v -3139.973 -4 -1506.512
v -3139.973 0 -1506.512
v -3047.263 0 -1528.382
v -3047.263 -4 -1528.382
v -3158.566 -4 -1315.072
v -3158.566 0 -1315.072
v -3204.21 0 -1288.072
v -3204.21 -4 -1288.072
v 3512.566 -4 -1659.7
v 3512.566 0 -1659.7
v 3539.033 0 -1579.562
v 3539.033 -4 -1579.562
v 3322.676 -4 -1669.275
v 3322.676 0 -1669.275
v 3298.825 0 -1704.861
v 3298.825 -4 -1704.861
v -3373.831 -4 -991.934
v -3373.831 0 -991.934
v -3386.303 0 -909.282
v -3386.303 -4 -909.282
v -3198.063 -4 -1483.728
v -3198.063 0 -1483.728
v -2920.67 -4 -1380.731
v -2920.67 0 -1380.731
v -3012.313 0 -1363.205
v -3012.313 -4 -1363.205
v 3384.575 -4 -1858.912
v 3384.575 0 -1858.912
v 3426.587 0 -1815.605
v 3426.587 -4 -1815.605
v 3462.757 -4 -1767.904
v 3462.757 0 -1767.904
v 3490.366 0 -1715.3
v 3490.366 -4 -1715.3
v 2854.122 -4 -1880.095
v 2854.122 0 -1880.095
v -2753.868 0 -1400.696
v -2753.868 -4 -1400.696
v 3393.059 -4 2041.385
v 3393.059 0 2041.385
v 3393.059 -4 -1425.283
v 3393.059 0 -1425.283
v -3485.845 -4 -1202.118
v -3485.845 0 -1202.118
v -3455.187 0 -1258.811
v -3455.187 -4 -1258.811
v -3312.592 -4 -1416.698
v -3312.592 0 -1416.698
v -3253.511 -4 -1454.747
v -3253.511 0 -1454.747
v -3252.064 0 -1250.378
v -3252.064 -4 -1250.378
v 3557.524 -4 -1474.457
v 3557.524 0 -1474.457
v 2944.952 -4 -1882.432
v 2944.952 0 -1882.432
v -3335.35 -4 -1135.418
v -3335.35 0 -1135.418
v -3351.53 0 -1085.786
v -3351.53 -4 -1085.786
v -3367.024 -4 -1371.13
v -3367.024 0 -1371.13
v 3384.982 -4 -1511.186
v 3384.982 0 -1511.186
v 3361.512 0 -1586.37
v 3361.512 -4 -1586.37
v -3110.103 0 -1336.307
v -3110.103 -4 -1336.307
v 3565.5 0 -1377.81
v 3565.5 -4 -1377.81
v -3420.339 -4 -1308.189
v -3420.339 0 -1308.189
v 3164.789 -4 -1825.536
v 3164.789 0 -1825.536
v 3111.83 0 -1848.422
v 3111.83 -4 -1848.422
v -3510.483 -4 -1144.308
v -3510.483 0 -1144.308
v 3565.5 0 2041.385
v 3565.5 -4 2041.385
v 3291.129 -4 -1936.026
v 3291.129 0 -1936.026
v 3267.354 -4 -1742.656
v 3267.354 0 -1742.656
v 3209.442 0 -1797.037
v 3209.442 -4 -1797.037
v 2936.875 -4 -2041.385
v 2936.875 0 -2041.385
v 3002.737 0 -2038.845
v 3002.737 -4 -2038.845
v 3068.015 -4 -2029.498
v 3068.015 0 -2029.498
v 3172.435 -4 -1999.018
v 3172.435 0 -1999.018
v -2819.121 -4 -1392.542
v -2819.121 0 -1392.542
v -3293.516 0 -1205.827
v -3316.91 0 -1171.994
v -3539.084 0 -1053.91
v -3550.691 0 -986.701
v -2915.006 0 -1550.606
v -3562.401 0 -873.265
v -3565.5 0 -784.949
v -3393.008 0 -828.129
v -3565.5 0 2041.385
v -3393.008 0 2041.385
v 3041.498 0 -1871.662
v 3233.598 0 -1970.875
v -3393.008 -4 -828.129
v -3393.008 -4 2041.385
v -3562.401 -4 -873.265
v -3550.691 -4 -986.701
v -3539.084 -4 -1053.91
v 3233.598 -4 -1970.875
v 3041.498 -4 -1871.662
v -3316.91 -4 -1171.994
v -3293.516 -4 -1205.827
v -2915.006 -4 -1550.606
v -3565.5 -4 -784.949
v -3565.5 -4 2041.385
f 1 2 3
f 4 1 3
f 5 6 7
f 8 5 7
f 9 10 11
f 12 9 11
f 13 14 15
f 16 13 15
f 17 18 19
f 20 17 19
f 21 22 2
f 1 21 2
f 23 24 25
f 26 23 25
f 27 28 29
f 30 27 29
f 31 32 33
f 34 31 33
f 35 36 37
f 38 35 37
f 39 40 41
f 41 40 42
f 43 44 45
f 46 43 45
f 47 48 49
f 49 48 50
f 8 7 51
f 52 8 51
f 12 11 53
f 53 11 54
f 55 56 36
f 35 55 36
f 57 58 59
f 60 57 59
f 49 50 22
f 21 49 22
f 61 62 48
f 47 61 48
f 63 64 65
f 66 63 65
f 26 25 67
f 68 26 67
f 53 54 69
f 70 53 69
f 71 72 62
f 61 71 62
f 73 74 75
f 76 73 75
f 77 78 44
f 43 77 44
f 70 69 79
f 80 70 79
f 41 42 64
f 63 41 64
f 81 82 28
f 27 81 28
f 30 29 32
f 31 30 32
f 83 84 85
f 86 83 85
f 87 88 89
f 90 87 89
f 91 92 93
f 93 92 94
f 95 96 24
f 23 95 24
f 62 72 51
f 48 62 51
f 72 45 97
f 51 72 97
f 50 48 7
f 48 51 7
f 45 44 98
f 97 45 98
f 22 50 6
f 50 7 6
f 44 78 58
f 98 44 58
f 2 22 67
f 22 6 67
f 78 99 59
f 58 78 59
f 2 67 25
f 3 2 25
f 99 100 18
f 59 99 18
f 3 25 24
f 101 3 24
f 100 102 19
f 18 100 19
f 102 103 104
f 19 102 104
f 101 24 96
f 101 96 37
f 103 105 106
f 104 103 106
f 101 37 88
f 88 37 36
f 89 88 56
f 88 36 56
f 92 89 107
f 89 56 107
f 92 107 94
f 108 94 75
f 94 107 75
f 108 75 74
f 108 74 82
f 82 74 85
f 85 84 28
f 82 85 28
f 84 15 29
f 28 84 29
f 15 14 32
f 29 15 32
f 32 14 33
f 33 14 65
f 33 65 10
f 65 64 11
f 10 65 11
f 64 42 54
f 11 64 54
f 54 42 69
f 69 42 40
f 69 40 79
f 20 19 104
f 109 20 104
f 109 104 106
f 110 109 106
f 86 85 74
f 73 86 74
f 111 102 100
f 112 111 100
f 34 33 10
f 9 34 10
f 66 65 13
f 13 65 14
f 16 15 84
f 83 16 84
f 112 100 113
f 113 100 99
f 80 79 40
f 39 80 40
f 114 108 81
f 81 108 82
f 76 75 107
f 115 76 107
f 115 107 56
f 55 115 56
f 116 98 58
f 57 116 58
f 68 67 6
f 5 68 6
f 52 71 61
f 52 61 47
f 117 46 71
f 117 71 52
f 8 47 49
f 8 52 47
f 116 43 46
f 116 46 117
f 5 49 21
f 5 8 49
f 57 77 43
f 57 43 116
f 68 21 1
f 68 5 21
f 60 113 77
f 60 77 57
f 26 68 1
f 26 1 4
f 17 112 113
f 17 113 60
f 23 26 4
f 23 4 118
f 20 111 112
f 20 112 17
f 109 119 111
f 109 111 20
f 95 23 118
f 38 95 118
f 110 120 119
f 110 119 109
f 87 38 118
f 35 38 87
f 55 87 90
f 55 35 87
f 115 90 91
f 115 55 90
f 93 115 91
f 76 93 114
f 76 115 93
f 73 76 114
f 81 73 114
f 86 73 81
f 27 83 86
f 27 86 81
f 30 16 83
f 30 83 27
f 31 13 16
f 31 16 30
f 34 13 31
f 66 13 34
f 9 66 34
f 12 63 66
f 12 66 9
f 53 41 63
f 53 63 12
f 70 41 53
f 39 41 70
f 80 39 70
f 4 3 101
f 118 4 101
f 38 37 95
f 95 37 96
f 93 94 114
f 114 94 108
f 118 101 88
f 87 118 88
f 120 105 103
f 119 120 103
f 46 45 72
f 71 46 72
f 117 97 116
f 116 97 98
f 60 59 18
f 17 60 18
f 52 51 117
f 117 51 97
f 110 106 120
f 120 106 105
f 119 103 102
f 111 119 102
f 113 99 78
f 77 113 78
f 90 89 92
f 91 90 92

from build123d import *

# Parameters (mm, degrees)
F1_DEPTH = 4


with BuildPart() as f1:
    # F0 (on Front) → F1 (new body)
    with BuildSketch(Plane.XZ):
        Polygon((-3393.0082, 2041.3853), (-3565.4996, 2041.3853), (-3565.4996, -784.9489), (-3562.4008, -873.2647), (-3550.6914, -986.7011), (-3539.0836, -1053.9095), (-3510.4832, -1144.3081), (-3485.8452, -1202.1185), (-3455.1874, -1258.8113), (-3420.3386, -1308.1889), (-3367.024, -1371.1301), (-3312.5918, -1416.6977), (-3253.5114, -1454.7469), (-3198.0632, -1483.7283), (-3139.9734, -1506.5121), (-3047.2634, -1528.3815), (-2915.0056, -1550.6065), (2936.875, -2041.3853), (3002.7372, -2038.8453), (3068.0152, -2029.4981), (3172.4346, -1999.0181), (3233.5978, -1970.8749), (3291.1288, -1936.0261), (3384.5754, -1858.9117), (3426.587, -1815.6047), (3462.7566, -1767.9035), (3490.3664, -1715.3001), (3512.566, -1659.6995), (3539.0328, -1579.5625), (3557.524, -1474.4573), (3565.4996, -1377.8103), (3565.4996, 2041.3853), (3393.059, 2041.3853), (3393.059, -1425.2829), (3384.9818, -1511.1857), (3361.5122, -1586.3697), (3322.6756, -1669.2753), (3298.825, -1704.8607), (3267.3544, -1742.6559), (3209.4424, -1797.0373), (3164.7892, -1825.5361), (3111.8302, -1848.4215), (3041.4976, -1871.6625), (2944.9522, -1882.4321), (2854.1218, -1880.0953), (-2753.868, -1400.6957), (-2819.1206, -1392.5423), (-2920.6698, -1380.7313), (-3012.313, -1363.2053), (-3110.103, -1336.3067), (-3158.5662, -1315.0723), (-3204.21, -1288.0721), (-3252.0636, -1250.3785), (-3293.5164, -1205.8269), (-3316.9098, -1171.9941), (-3335.3502, -1135.4181), (-3351.53, -1085.7865), (-3373.8312, -991.9335), (-3386.3026, -909.2819), (-3393.0082, -828.1289), align=None)
    extrude(amount=F1_DEPTH)


solid = f1.part
